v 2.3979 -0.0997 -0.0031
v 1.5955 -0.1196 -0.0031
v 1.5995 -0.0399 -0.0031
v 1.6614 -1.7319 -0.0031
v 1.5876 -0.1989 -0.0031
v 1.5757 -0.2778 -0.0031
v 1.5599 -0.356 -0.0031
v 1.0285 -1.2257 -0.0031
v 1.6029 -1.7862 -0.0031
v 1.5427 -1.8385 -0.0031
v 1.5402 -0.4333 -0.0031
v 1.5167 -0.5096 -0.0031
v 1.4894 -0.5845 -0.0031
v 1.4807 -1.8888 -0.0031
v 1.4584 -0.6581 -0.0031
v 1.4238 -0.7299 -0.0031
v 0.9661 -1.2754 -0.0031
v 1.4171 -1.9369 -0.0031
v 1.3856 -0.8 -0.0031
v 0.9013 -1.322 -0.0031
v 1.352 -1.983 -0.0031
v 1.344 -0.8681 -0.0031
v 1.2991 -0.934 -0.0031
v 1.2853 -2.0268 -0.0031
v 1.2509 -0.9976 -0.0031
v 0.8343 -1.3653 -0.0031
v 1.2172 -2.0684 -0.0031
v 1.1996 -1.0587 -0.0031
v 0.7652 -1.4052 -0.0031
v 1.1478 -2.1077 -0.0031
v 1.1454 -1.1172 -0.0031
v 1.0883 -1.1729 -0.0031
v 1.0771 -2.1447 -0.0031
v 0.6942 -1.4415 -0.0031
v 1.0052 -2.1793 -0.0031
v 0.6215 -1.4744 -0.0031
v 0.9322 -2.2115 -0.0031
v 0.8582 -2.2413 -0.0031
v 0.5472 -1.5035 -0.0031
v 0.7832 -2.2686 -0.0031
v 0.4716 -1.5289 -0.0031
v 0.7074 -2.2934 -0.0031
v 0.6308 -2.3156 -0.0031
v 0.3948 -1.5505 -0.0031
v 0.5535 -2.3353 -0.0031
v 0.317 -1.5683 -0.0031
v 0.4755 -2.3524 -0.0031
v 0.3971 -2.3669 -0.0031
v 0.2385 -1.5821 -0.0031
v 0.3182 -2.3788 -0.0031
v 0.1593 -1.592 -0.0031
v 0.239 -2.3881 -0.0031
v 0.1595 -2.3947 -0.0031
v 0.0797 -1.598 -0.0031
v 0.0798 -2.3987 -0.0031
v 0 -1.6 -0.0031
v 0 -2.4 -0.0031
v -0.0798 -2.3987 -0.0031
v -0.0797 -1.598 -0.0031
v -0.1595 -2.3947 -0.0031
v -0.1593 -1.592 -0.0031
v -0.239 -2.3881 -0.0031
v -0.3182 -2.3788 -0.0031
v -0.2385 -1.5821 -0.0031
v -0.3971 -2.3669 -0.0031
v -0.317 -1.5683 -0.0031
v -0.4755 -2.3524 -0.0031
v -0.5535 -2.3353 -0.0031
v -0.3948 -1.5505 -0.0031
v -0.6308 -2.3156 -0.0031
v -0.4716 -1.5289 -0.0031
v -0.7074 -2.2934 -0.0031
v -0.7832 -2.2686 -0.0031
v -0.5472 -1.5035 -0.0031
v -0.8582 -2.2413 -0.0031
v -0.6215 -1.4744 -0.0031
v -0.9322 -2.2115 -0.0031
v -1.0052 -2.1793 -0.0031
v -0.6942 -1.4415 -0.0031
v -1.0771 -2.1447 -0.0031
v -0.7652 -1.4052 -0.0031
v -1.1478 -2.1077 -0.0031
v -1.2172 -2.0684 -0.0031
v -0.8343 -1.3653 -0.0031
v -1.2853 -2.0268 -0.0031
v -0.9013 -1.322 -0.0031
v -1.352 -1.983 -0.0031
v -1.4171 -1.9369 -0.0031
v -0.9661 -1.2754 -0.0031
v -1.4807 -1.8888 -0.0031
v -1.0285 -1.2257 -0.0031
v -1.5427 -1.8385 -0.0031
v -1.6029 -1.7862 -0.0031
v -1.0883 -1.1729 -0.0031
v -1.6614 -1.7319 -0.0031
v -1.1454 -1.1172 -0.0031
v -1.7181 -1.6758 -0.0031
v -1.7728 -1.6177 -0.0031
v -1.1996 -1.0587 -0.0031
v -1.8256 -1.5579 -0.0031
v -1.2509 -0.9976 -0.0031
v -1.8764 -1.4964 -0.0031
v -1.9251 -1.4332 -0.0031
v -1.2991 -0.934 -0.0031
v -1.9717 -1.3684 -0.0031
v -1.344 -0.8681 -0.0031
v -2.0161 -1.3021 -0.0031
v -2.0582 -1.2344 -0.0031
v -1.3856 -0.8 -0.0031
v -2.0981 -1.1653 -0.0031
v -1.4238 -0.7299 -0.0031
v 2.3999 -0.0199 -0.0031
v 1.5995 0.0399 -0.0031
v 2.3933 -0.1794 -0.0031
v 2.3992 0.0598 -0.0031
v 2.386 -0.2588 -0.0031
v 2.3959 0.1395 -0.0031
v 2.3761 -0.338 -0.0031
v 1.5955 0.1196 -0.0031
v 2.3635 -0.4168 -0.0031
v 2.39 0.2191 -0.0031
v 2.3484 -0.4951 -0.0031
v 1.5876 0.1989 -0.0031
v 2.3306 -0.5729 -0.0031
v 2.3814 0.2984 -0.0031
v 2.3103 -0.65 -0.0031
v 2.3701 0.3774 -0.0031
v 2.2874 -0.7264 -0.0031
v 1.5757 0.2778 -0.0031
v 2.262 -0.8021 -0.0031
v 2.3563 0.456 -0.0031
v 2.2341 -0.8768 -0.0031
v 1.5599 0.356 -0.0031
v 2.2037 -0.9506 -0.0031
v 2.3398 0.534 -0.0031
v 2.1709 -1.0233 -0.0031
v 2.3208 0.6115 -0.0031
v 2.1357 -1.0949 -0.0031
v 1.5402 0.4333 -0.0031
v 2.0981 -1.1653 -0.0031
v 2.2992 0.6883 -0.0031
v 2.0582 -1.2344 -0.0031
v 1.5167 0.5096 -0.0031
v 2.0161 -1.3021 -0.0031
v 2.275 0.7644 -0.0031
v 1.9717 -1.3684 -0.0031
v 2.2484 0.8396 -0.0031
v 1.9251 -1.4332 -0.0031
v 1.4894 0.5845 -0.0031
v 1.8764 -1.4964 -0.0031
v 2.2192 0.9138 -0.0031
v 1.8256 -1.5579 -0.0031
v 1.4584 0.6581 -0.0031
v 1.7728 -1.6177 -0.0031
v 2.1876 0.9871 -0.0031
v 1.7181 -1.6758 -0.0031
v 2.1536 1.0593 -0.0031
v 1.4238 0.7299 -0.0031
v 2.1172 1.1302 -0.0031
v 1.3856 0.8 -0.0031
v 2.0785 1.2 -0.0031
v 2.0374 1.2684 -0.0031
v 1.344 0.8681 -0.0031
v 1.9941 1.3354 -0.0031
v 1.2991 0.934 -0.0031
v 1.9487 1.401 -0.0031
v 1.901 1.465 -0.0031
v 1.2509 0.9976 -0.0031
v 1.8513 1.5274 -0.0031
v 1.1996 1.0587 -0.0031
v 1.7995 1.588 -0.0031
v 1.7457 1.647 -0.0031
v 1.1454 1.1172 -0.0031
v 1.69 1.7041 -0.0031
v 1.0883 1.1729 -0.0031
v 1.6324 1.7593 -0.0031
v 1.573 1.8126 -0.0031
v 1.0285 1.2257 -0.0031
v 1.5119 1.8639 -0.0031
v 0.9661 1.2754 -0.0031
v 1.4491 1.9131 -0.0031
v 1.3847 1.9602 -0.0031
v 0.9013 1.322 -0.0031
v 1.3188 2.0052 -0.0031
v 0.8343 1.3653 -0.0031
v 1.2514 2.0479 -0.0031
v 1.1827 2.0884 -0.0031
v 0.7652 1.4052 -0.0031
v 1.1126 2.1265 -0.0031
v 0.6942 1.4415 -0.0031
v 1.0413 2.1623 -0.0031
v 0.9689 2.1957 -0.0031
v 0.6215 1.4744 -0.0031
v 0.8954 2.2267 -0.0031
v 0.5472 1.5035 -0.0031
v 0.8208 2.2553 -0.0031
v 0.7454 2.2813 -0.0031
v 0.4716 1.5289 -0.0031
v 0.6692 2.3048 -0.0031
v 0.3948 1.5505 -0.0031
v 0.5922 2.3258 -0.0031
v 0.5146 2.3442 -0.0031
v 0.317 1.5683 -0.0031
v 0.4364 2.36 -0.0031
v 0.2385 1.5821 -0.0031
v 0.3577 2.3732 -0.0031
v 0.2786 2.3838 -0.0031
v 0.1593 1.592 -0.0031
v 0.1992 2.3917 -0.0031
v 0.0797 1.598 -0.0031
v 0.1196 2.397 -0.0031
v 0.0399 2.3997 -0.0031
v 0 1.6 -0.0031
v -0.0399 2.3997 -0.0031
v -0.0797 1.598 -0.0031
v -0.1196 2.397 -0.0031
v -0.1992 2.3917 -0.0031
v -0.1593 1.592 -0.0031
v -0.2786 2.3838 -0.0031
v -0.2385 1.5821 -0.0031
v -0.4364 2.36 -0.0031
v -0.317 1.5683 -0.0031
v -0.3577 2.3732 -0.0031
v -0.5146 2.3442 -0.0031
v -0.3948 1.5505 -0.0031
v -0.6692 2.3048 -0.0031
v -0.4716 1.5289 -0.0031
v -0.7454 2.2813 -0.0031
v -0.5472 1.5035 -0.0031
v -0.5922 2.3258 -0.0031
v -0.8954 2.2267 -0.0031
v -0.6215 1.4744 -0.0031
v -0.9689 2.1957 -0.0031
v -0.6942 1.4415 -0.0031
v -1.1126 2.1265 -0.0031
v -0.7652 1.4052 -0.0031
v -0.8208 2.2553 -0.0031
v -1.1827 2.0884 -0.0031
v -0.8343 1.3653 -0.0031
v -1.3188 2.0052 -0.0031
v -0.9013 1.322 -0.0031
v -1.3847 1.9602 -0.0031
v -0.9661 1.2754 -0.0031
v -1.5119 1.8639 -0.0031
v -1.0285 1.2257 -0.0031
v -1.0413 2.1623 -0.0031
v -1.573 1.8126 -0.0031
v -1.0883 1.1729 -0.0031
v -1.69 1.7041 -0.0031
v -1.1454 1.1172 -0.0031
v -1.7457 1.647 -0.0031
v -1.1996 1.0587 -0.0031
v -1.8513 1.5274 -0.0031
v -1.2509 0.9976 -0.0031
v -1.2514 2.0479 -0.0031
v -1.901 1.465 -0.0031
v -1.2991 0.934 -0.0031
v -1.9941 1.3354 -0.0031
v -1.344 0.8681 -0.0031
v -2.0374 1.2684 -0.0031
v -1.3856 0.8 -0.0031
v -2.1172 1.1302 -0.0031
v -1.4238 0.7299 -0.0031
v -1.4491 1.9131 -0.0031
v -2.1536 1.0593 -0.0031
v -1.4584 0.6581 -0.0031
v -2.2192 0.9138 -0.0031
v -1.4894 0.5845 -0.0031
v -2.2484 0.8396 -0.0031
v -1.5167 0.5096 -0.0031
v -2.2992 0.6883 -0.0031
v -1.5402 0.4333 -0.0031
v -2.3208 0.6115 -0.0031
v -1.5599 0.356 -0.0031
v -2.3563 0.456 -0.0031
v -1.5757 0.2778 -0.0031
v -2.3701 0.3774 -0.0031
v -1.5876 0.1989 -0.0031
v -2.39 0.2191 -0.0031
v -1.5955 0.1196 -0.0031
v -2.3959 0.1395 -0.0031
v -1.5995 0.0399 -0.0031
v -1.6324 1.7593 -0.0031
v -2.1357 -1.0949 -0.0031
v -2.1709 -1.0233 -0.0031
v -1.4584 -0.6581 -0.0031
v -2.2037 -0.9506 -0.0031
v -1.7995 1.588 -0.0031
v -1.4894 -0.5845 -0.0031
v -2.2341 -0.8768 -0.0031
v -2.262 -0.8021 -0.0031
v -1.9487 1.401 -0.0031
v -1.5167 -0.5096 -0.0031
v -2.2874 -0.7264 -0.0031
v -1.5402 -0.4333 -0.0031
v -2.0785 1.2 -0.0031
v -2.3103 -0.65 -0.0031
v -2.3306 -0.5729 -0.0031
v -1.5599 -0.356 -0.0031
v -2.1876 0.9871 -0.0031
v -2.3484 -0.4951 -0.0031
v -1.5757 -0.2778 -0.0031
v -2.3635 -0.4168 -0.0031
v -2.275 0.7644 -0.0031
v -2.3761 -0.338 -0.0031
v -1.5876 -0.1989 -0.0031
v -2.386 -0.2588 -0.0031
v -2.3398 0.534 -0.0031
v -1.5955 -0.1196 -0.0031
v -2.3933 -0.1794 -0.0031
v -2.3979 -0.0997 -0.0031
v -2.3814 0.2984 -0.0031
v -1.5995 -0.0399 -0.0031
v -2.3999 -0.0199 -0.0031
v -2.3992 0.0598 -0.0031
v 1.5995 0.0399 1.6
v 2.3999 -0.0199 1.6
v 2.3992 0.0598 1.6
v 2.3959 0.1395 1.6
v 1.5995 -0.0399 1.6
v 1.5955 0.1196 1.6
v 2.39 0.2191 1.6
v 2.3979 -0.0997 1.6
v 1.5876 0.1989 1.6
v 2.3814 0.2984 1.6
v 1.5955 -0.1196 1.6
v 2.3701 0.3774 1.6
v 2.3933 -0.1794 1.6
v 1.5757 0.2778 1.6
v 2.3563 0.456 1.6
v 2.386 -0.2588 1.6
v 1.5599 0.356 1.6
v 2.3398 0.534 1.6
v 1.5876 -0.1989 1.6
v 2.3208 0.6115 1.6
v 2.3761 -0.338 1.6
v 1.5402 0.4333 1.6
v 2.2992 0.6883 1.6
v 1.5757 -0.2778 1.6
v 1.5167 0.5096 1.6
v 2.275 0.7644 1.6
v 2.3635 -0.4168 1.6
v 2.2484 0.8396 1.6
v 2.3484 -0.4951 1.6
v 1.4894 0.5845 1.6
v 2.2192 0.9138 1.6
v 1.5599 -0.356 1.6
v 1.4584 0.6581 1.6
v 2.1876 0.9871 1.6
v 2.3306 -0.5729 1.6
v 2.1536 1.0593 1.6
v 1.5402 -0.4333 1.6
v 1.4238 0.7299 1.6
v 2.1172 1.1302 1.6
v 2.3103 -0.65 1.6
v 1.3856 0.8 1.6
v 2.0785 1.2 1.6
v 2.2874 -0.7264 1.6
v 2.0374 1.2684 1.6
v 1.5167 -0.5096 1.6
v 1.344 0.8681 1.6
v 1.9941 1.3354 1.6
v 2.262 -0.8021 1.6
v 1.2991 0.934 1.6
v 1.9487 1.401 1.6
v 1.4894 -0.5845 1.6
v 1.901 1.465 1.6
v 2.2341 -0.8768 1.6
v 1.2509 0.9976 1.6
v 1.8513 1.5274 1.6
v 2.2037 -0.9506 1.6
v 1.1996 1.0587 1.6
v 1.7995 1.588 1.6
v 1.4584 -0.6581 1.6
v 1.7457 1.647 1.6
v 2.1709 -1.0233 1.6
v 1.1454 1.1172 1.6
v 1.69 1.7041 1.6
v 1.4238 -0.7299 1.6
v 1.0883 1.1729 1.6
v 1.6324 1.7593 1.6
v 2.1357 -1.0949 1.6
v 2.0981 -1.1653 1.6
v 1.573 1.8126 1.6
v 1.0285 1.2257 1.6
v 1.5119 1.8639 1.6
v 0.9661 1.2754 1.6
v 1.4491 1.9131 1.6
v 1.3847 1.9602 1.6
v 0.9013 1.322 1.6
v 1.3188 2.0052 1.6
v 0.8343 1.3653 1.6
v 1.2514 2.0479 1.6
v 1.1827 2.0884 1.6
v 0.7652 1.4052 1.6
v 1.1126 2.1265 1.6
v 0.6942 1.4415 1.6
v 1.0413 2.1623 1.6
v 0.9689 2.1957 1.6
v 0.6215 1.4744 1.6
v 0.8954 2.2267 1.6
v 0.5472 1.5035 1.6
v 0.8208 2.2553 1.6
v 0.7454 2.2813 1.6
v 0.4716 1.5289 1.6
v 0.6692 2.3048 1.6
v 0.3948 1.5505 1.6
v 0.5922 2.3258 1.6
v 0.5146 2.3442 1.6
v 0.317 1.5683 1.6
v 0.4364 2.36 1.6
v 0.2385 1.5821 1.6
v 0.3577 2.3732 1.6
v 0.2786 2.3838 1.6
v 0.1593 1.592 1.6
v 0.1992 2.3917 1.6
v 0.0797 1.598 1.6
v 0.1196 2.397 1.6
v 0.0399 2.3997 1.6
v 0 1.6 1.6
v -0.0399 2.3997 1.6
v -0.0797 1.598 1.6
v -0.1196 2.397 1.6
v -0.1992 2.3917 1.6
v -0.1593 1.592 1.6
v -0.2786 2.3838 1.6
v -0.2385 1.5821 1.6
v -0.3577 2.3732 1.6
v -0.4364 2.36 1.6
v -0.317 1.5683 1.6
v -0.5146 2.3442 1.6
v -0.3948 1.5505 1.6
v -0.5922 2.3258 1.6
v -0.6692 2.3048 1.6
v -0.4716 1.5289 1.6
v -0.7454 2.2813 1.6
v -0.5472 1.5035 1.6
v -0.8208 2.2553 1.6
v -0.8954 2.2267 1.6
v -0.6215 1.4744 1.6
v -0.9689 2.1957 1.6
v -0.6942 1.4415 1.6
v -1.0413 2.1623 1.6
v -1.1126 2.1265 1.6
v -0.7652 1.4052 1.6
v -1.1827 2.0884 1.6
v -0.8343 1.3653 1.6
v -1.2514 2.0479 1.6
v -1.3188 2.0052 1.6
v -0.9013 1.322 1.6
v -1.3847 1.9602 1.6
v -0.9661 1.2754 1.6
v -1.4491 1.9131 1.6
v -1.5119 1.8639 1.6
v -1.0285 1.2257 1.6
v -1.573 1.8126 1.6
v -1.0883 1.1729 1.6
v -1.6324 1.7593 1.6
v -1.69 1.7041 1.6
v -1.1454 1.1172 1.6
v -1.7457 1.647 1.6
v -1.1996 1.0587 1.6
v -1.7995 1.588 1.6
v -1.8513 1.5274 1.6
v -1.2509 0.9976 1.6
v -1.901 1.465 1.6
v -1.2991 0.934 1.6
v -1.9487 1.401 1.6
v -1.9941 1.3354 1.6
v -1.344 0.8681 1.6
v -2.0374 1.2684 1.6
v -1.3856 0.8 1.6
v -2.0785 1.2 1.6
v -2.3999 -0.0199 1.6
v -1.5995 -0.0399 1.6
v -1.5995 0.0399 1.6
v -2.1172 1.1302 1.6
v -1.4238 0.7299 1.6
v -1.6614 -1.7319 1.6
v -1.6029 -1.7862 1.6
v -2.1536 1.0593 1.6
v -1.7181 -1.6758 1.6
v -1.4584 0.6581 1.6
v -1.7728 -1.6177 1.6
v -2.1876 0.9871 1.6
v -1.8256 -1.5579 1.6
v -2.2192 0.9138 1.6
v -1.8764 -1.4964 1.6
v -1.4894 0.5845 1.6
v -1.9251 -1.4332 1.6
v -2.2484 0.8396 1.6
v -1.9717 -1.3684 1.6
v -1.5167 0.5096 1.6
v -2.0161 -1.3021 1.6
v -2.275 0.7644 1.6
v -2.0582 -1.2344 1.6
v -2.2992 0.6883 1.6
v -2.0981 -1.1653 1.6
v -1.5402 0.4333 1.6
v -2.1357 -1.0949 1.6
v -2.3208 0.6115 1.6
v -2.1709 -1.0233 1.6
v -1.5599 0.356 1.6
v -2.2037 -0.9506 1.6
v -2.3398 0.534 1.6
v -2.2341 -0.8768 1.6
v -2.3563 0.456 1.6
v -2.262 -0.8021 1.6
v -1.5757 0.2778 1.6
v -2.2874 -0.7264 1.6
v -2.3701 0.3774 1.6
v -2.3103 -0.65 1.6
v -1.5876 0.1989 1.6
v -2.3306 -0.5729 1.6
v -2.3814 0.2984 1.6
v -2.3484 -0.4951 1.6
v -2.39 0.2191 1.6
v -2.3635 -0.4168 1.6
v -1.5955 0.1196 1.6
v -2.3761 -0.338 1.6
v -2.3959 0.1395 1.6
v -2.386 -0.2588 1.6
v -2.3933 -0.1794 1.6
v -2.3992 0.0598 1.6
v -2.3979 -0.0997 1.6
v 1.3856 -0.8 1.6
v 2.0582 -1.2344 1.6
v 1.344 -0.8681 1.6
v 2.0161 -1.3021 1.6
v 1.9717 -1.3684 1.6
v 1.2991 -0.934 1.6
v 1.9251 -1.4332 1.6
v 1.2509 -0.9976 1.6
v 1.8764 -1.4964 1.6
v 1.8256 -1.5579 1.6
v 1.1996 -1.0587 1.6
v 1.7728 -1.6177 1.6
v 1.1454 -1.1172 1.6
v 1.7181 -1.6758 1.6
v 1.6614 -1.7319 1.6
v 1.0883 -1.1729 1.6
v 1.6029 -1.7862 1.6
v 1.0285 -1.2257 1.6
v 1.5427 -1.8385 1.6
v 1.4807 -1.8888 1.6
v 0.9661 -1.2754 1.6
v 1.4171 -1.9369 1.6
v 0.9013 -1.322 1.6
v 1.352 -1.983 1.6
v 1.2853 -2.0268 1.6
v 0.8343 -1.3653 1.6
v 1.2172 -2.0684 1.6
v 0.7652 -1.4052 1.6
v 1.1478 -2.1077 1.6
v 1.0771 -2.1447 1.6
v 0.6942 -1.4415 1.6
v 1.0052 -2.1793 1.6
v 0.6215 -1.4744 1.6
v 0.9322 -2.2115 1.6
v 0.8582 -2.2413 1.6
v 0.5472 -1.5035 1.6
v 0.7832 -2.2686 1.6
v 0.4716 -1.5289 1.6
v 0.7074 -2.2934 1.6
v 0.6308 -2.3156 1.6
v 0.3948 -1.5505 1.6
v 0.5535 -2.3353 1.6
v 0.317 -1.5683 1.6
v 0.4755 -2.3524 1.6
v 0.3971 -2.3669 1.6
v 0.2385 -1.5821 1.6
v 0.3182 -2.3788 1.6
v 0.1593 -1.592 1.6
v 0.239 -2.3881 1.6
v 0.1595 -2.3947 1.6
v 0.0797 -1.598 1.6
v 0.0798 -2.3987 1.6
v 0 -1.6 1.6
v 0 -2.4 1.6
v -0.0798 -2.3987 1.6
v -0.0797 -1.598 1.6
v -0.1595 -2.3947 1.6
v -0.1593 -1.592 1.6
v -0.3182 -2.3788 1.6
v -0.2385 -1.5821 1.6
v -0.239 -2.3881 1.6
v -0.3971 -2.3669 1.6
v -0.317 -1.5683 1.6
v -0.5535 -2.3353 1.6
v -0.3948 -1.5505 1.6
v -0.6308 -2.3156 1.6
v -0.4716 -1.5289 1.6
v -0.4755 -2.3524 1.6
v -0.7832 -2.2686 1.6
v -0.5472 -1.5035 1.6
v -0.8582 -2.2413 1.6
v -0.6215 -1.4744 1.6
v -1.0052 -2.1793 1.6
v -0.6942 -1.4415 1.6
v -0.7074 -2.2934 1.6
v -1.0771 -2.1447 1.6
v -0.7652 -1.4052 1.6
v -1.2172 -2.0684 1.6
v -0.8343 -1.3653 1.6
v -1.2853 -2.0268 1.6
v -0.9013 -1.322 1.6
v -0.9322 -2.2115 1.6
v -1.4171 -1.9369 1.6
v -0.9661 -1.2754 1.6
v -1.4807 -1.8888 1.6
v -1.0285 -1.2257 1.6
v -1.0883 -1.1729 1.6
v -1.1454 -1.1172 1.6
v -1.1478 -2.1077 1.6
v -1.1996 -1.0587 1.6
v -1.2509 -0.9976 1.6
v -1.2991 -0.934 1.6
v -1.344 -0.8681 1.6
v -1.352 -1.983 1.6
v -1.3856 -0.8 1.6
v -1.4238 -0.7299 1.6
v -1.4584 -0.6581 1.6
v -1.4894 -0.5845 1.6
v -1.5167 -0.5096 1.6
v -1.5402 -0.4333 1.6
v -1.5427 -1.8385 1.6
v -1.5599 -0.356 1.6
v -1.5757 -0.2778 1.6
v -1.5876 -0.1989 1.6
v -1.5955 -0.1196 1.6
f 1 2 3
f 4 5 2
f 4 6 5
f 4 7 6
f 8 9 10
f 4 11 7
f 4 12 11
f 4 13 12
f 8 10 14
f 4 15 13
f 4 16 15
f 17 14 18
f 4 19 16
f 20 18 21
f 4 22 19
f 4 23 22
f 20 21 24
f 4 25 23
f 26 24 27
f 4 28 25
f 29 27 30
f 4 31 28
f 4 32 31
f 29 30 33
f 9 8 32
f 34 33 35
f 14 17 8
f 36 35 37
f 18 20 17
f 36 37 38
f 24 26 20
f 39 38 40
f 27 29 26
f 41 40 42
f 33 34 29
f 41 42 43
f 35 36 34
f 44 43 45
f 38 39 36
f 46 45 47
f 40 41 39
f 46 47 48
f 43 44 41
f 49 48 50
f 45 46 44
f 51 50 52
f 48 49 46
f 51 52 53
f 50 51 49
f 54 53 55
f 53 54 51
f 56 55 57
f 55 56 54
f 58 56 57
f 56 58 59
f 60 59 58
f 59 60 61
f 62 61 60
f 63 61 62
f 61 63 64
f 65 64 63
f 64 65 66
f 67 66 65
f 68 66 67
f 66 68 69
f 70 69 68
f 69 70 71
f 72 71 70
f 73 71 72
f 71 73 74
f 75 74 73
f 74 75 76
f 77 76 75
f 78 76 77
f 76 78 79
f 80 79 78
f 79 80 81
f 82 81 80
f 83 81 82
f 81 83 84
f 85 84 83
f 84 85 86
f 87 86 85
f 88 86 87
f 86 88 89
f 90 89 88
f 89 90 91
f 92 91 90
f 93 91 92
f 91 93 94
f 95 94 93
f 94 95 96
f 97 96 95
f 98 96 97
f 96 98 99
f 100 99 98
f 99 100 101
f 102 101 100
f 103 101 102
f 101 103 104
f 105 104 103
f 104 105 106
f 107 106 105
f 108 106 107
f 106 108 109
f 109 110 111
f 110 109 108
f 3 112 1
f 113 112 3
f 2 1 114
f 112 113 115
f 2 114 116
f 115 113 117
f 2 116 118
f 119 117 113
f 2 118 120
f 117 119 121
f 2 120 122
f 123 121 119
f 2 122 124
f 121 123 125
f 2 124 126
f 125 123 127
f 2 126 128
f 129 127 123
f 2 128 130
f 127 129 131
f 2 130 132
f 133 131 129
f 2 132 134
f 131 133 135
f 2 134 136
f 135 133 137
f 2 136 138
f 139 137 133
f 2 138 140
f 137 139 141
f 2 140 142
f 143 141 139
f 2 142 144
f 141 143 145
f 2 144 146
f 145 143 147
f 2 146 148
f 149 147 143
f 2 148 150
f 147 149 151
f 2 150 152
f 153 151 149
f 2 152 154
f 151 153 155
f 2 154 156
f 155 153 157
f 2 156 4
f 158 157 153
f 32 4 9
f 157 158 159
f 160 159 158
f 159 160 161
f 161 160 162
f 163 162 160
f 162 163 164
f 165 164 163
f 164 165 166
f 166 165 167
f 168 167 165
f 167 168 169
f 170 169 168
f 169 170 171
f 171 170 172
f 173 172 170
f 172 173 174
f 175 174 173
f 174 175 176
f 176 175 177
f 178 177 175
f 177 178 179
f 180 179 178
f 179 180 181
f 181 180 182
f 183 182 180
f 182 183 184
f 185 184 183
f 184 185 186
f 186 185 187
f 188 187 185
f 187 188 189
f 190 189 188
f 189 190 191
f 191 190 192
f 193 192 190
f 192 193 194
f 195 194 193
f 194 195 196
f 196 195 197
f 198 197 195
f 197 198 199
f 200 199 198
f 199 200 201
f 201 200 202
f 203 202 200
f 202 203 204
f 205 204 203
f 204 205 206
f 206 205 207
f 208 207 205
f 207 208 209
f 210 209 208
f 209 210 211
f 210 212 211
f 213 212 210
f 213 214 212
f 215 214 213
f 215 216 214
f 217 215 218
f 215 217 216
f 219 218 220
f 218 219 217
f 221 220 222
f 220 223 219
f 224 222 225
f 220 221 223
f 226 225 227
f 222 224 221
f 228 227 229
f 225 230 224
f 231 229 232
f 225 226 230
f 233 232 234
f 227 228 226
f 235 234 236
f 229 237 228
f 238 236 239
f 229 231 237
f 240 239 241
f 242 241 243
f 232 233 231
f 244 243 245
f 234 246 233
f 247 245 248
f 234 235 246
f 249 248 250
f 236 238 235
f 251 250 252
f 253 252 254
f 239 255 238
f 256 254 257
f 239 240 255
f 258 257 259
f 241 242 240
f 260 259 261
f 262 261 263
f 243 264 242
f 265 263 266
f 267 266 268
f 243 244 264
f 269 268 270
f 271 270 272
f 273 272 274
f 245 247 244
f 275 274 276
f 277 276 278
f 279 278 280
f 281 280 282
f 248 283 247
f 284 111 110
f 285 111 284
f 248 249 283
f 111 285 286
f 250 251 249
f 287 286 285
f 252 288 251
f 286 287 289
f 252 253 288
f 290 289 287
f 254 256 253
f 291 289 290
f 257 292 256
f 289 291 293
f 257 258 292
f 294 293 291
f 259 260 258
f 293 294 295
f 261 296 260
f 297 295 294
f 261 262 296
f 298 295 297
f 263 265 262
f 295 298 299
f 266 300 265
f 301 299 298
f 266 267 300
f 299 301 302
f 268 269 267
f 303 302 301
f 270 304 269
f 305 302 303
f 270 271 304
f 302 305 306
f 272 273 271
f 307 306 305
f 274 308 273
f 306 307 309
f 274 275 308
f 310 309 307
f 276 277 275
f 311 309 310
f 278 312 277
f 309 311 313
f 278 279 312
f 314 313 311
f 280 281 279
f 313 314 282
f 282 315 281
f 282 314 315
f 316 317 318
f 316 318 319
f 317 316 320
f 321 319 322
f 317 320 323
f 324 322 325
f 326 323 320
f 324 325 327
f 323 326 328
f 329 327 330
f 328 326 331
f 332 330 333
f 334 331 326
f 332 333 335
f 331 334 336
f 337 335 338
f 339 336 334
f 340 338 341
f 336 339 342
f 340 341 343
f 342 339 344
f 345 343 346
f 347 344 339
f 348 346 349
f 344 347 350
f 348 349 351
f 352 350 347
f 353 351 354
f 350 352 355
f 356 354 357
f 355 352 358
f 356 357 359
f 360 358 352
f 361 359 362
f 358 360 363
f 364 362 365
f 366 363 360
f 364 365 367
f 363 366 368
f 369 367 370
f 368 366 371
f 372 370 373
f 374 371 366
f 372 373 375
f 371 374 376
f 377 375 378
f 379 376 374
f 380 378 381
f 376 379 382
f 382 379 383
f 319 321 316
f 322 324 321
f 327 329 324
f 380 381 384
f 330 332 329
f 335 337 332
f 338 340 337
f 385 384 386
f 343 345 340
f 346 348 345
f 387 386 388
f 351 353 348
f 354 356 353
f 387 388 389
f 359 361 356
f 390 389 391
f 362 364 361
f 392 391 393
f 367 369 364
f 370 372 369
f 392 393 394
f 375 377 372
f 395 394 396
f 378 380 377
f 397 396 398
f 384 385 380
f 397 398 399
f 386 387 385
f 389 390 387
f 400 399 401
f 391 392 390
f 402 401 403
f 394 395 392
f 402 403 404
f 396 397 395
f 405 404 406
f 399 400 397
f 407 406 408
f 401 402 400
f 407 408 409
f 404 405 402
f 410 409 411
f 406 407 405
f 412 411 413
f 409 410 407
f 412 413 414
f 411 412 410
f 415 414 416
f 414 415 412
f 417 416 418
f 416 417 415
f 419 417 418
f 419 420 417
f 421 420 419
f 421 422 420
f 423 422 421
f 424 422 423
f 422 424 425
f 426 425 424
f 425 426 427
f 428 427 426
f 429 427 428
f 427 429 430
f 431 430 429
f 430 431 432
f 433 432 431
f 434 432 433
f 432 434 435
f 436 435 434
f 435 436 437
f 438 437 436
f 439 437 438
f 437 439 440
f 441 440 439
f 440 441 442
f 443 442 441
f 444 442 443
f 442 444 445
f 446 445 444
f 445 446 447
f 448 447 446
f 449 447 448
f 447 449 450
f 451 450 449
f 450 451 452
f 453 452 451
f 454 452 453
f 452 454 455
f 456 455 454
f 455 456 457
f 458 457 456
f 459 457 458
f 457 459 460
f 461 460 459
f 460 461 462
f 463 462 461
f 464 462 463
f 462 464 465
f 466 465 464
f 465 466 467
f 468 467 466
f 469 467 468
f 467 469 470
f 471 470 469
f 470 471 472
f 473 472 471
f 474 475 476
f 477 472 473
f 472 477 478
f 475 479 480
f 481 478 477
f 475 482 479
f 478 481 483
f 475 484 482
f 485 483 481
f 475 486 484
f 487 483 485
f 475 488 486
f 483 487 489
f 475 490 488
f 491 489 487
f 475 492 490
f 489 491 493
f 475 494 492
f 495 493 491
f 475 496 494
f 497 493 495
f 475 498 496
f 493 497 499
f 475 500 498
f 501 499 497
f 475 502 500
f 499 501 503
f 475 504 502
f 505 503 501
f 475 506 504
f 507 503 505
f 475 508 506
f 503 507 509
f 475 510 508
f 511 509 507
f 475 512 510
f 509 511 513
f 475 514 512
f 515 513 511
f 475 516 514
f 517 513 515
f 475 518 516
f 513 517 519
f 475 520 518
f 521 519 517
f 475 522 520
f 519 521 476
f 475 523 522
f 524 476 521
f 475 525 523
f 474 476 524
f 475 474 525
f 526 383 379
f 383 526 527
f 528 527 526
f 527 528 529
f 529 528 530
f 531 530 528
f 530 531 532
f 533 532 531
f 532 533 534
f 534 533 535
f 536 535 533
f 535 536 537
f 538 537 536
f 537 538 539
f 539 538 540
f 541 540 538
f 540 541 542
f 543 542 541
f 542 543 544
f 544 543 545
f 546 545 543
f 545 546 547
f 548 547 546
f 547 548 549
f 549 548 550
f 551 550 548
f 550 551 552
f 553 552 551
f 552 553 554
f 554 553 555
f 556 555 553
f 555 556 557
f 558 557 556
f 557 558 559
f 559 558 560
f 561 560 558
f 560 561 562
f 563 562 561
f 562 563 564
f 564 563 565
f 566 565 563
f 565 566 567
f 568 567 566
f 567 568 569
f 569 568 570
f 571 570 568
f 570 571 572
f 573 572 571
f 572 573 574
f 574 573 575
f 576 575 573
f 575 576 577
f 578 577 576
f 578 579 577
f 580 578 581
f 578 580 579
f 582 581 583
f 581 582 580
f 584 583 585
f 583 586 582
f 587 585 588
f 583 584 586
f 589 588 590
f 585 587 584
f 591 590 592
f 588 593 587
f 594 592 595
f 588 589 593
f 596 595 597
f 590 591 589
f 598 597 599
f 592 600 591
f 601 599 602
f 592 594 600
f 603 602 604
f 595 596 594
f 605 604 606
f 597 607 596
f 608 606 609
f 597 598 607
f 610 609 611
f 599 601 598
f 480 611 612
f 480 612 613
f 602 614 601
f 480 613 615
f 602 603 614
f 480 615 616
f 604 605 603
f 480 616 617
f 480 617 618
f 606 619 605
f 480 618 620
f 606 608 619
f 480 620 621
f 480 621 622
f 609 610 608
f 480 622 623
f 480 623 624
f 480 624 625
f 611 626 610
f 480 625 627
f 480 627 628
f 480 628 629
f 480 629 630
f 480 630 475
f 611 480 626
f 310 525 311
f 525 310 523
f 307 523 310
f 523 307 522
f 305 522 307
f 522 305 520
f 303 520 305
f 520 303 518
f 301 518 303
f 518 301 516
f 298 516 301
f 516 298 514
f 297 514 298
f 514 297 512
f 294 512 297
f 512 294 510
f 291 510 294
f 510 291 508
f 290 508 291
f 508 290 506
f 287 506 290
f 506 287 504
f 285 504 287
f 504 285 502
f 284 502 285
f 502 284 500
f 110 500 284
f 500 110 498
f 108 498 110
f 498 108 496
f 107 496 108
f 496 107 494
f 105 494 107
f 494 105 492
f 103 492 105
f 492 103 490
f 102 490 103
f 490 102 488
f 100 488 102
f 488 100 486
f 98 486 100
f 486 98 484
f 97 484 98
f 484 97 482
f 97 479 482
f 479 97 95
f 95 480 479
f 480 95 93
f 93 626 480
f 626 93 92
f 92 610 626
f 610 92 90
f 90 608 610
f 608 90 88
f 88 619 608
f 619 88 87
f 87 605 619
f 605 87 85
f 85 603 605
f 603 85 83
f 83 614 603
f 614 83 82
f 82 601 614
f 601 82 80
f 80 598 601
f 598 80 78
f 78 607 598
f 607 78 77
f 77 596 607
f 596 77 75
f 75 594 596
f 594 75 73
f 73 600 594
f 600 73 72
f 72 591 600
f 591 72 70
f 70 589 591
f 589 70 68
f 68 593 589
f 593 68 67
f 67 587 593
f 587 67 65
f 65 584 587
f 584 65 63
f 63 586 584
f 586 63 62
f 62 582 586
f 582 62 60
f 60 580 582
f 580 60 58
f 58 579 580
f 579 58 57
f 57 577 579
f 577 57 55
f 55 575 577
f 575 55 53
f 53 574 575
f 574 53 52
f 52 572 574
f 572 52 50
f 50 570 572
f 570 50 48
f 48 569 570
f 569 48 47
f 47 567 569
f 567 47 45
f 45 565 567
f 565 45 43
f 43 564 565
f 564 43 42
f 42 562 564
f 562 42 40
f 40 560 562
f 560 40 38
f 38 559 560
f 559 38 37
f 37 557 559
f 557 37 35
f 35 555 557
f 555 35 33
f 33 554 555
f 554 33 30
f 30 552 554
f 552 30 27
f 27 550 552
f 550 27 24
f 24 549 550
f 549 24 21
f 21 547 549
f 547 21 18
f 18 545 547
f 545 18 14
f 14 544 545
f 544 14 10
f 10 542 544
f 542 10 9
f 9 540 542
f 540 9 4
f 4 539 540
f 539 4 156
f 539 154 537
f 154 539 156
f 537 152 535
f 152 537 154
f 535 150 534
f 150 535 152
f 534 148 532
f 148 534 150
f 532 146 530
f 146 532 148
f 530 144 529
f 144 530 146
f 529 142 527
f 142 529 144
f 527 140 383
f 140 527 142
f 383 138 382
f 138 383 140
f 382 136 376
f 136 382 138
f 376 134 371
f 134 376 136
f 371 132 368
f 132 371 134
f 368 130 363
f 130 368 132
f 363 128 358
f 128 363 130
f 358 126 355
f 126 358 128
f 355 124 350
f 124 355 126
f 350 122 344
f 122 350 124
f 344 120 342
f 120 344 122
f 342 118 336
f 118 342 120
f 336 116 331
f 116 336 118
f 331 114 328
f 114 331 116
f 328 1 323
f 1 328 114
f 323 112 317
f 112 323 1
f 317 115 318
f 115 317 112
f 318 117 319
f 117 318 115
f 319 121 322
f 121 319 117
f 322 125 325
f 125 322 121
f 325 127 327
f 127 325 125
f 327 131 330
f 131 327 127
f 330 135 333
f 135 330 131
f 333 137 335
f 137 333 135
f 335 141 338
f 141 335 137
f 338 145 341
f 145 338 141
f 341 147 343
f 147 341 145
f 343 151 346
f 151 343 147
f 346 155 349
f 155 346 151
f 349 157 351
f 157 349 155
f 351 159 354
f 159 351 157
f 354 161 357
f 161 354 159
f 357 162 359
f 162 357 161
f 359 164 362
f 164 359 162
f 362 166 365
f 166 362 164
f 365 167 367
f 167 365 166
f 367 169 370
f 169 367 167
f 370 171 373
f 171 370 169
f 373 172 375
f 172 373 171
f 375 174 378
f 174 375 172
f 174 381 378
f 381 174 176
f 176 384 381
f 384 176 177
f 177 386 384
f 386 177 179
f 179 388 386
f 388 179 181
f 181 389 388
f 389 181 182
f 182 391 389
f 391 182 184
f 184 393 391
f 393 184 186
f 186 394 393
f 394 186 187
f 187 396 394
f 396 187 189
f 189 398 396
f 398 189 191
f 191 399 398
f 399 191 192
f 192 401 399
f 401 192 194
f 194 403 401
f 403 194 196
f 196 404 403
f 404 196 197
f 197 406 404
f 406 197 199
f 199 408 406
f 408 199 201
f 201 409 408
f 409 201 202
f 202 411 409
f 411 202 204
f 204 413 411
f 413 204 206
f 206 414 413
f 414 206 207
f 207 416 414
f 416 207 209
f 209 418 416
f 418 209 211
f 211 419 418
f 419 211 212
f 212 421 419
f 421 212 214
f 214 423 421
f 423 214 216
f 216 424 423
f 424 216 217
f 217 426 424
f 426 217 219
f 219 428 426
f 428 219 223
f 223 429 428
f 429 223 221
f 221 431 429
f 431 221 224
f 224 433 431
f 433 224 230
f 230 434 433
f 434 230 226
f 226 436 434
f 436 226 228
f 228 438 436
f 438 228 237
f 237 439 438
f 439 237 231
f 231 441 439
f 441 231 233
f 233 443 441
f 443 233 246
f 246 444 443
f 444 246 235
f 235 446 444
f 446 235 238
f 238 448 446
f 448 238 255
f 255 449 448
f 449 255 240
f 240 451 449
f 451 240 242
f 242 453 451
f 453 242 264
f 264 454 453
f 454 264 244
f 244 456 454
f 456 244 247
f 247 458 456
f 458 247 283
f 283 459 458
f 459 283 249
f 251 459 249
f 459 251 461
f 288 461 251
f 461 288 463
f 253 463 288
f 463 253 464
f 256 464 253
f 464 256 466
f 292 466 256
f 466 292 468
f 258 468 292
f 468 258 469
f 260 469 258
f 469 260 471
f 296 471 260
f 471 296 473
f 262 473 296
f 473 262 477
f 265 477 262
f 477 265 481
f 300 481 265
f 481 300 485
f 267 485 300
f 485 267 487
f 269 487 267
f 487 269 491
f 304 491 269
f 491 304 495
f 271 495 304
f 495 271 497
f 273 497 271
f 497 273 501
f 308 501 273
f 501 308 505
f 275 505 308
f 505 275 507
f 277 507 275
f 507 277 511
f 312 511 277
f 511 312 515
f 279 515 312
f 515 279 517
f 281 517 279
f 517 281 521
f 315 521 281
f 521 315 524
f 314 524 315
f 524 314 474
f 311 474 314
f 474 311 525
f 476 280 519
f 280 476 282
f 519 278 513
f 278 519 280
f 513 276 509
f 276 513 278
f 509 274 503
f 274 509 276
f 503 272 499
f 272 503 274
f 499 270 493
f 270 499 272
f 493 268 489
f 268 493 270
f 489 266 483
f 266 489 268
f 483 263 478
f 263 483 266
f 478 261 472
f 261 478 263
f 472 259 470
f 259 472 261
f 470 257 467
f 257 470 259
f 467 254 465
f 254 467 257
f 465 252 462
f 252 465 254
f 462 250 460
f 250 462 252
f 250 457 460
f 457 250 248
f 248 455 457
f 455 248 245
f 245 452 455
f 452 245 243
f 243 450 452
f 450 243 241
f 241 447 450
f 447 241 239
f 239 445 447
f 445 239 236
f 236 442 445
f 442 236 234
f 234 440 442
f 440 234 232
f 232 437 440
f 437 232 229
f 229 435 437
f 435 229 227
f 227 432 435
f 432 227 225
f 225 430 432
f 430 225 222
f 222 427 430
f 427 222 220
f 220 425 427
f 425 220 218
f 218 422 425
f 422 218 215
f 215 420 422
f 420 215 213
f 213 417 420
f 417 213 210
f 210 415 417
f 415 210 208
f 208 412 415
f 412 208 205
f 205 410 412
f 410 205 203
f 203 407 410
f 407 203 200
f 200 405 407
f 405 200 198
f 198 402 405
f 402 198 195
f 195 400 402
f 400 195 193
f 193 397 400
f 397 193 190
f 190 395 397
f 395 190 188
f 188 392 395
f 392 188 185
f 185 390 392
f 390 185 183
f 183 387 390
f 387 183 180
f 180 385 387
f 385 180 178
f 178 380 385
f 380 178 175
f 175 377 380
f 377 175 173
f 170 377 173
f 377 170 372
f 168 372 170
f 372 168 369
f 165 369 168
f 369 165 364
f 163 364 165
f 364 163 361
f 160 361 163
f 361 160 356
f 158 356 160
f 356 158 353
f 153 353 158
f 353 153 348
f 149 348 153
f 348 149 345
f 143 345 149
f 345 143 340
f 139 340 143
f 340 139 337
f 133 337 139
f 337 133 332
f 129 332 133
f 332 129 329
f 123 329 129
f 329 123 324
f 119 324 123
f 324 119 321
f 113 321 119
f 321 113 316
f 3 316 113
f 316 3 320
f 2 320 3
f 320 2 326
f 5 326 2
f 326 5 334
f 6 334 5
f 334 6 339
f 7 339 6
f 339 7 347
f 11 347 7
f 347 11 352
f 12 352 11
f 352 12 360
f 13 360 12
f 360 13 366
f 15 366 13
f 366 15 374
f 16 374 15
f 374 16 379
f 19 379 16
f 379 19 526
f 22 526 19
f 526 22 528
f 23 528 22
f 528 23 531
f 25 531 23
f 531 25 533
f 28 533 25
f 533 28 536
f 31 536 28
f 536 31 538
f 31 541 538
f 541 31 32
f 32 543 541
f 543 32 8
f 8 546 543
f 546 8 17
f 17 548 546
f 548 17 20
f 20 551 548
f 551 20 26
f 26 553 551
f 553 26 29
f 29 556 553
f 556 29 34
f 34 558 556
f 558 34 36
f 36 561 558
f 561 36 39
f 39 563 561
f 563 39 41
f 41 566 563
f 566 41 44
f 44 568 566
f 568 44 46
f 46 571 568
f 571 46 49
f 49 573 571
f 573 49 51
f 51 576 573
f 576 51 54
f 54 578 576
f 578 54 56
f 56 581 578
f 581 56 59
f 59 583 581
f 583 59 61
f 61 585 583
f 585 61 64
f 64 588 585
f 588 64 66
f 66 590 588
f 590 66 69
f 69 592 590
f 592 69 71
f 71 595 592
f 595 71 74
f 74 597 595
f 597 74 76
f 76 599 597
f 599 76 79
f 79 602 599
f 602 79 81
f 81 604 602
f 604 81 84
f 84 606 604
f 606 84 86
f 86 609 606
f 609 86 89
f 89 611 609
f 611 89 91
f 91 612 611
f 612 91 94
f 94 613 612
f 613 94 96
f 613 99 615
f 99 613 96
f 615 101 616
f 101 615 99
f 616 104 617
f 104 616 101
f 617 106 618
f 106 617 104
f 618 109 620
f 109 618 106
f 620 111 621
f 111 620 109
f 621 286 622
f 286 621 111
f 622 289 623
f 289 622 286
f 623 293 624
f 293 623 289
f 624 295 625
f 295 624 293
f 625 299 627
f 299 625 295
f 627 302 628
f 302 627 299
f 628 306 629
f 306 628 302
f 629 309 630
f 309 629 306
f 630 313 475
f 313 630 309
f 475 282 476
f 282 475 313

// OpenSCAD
use <../lib.scad>
use <../p/4-4cylc.scad>
use <../p/4-4cylo.scad>
use <../p/4-4disc.scad>
use <../p/4-4ring3.scad>
use <../p/4-4ring4.scad>
use <../p/box4o4a.scad>
use <../p/stud2.scad>
$fa=1; $fs=0.2;
function ldraw_lib__25893(realsolid=false) = [
// 0 ~Plate  1 x  1 Round with Horizontal Handle Below (Obsolete)
// 0 Name: 25893.dat
// 0 Author: Magnus Forsberg [MagFors]
// 0 !LDRAW_ORG Part UPDATE 2022-04
// 0 !LICENSE Licensed under CC BY 2.0 and CC BY 4.0 : see CAreadme.txt
// 
// 0 BFC CERTIFY CCW
  [0,"BFC","CERTIFY"],
  [0,"BFC","CCW"],
// 
// 0 !HISTORY 2016-12-31 [PTadmin] Official Update 2016-01
// 0 !HISTORY 2022-03-30 [OrionP] Obsoleted due to incorrect geometry and replaced with 25893a
// 0 !HISTORY 2022-07-18 [PTadmin] Official Update 2022-04
// 
// 
// 1 16 0 3 0 -10 0 0 0 -1 0 0 0 10 4-4disc.dat
  [1,16,0,3,0,-10,0,0,0,-1,0,0,0,10, ldraw_lib__4_4disc(realsolid)],
// 1 16 0 0 0 10 0 0 0 3 0 0 0 10 4-4cylo.dat
  [1,16,0,0,0,10,0,0,0,3,0,0,0,10, ldraw_lib__4_4cylo(realsolid)],
// 1 16 0 0 0 2 0 0 0 1 0 0 0 2 4-4ring4.dat
  [1,16,0,0,0,2,0,0,0,1,0,0,0,2, ldraw_lib__4_4ring4(realsolid)],
// 1 16 0 0 0 2 0 0 0 1 0 0 0 2 4-4ring3.dat
  [1,16,0,0,0,2,0,0,0,1,0,0,0,2, ldraw_lib__4_4ring3(realsolid)],
// 1 16 0 0 0 4 0 0 0 1 0 0 0 4 4-4disc.dat
  [1,16,0,0,0,4,0,0,0,1,0,0,0,4, ldraw_lib__4_4disc(realsolid)],
// 1 16 0 0 0 1 0 0 0 1 0 0 0 1 stud2.dat
  [1,16,0,0,0,1,0,0,0,1,0,0,0,1, ldraw_lib__stud2(realsolid)],
// 
// 1 16 -10 10 0 0 20 0 -4 0 0 0 0 4 4-4cylc.dat
  [1,16,-10,10,0,0,20,0,-4,0,0,0,0,4, ldraw_lib__4_4cylc(realsolid)],
// 1 16 10 10 0 0 -1 0 -4 0 0 0 0 -4 4-4disc.dat
  [1,16,10,10,0,0,-1,0,-4,0,0,0,0,-4, ldraw_lib__4_4disc(realsolid)],
// 
// 1 16 0 3 0 9.6 0 0 0 3.61797 0 0 0 2 box4o4a.dat
  [1,16,0,3,0,9.6,0,0,0,3.61797,0,0,0,2, ldraw_lib__box4o4a(realsolid)],
// 2 24 -9.6 6.617971 -2 9.6 6.61797 -2
  [2,24,-9.6,6.617971,-2,9.6,6.61797,-2],
// 2 24 -9.6 6.617971 2 9.6 6.61797 2
  [2,24,-9.6,6.617971,2,9.6,6.61797,2],
// 
// 2 24 9.6 6.3044 1.5308 9.6 6 0
  [2,24,9.6,6.3044,1.5308,9.6,6,0],
// 2 24 9.6 6.3044 1.5308 9.6 6.61797 2
  [2,24,9.6,6.3044,1.5308,9.6,6.61797,2],
// 2 24 9.6 6.3044 -1.5308 9.6 6 0
  [2,24,9.6,6.3044,-1.5308,9.6,6,0],
// 2 24 9.6 6.61797 -2 9.6 6.3044 -1.5308
  [2,24,9.6,6.61797,-2,9.6,6.3044,-1.5308],
// 2 24 -9.6 6.3044 1.5308 -9.6 6 0
  [2,24,-9.6,6.3044,1.5308,-9.6,6,0],
// 2 24 -9.6 6.3044 1.5308 -9.6 6.61797 2
  [2,24,-9.6,6.3044,1.5308,-9.6,6.61797,2],
// 2 24 -9.6 6.3044 -1.5308 -9.6 6 0
  [2,24,-9.6,6.3044,-1.5308,-9.6,6,0],
// 2 24 -9.6 6.61797 -2 -9.6 6.3044 -1.5308
  [2,24,-9.6,6.61797,-2,-9.6,6.3044,-1.5308],
];
module ldraw_lib__25893(step=0, col=false, unit=2/5, alt=false, line=0.2, solid=!$preview)
    makepoly(ldraw_lib__25893(solid), step=step, col=col, unit=unit, alt=alt, line=line, solid=solid);
ldraw_lib__25893(line=0.2);
